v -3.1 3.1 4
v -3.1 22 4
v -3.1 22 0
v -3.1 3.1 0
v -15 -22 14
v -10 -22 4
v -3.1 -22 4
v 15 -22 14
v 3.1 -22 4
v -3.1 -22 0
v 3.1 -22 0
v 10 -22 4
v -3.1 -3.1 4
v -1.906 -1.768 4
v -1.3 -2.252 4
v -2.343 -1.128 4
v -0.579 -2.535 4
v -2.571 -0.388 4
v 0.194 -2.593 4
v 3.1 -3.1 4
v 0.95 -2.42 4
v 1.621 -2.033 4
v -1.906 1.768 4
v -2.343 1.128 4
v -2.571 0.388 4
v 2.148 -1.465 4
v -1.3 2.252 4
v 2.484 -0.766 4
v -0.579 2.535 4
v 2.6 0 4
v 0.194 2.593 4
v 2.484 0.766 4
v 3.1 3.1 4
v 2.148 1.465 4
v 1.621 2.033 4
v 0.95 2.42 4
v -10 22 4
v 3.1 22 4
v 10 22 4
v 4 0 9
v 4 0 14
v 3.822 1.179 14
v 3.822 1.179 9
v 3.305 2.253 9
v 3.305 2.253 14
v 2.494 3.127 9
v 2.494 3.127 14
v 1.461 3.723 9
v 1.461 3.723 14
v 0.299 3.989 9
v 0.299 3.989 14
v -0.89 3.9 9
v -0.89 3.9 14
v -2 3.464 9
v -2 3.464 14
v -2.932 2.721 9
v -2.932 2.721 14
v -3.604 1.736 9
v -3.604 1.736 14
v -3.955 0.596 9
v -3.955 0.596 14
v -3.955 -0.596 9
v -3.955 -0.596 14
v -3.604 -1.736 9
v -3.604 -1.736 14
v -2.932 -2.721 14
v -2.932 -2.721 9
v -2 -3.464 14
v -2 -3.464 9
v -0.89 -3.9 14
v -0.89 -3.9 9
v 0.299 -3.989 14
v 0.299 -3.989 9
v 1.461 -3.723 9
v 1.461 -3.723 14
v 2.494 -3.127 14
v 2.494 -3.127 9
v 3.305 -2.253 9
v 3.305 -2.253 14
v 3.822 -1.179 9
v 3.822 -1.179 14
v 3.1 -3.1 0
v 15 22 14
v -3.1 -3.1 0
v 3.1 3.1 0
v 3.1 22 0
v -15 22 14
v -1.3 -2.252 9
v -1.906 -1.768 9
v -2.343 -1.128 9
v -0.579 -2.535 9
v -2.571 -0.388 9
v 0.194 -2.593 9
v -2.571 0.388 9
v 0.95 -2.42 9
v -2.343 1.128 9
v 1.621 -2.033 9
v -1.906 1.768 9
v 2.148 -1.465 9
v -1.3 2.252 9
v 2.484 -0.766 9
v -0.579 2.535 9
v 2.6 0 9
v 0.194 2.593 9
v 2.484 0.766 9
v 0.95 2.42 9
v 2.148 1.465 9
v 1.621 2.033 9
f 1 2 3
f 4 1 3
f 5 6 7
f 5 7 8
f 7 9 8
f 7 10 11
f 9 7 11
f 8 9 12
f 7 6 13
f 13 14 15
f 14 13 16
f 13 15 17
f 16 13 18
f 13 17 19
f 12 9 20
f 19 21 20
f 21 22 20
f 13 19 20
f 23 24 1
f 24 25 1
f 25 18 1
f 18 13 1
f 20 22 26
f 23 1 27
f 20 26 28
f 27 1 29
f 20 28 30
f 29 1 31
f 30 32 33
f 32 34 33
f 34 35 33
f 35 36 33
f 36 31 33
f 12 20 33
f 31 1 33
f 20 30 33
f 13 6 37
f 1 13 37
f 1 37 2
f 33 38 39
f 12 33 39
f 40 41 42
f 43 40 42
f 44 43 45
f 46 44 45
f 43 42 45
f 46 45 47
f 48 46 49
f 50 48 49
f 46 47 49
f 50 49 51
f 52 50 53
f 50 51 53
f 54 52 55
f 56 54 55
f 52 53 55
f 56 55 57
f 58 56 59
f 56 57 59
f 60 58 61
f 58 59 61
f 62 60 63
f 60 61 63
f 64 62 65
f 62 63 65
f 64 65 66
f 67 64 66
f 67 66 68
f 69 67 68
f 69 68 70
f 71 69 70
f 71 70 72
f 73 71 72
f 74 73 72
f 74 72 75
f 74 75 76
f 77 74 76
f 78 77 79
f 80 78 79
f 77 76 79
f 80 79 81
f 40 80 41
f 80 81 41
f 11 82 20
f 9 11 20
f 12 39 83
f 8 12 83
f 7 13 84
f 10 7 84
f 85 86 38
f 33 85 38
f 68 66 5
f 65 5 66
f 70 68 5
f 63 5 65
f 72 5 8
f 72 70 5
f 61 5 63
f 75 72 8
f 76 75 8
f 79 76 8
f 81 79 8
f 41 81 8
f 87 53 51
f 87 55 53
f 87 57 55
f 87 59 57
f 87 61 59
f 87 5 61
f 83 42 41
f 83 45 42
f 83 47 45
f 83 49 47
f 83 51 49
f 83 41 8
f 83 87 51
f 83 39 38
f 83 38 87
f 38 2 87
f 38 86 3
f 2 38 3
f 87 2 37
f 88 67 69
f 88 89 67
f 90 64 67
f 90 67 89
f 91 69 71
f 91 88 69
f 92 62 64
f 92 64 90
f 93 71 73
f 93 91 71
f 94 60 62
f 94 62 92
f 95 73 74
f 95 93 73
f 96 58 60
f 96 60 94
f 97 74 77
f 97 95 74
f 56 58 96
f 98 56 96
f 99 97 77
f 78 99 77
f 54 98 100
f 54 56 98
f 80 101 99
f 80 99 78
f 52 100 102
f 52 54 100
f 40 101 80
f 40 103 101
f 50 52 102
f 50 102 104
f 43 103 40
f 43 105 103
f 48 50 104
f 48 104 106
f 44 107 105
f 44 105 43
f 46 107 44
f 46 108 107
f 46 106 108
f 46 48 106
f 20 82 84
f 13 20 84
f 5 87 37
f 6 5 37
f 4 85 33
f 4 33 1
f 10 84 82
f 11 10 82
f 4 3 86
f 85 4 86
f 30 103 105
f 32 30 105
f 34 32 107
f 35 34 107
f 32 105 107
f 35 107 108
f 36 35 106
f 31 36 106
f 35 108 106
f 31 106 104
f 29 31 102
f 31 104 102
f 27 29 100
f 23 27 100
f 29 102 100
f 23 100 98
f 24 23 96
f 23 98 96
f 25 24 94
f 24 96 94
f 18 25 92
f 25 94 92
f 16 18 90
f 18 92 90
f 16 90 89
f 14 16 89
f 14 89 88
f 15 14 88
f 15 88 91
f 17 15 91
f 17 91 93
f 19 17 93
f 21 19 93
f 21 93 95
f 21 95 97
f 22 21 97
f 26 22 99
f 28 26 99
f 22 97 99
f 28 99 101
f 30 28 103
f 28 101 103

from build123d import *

# Parameters (mm, degrees)
EXTRUDE_1_DEPTH     = 14
CUT_EXTRUDE_1_DEPTH = 44
SKETCH_3_W          = 6.2
SKETCH_3_H          = 6.2
CUT_EXTRUDE_2_DEPTH = 4
SKETCH_4_R          = 4
CUT_EXTRUDE_3_DEPTH = 5
SKETCH_5_R          = 2.6
CUT_EXTRUDE_4_DEPTH = 5


with BuildPart() as part:
    # 草图1 → 凸台-拉伸1 (new body)
    with BuildSketch(Plane.XY):
        Polygon((-15, 22), (-15, -22), (15, -22), (15, 22), (0, 22), align=None)
    extrude(amount=EXTRUDE_1_DEPTH)

    # 草图2 → 切除-拉伸1 (cut)
    with BuildSketch(Plane(origin=(0, 22, 0), x_dir=(1, 0, 0), z_dir=(0, 1, 0))):
        Polygon((-15, 0), (-15, -14), (-10, -4), (-3.1, -4), (-3.1, 0), align=None)
        Polygon((3.1, -4), (10, -4), (15, -14), (15, 0), (3.1, 0), align=None)
    extrude(amount=-CUT_EXTRUDE_1_DEPTH, mode=Mode.SUBTRACT)

    # 草图3 → 切除-拉伸2 (cut)
    with BuildSketch(Plane(origin=(0, 0, 0), x_dir=(-1, 0, 0), z_dir=(0, 0, -1))):
        Rectangle(SKETCH_3_W, SKETCH_3_H)
    extrude(amount=-CUT_EXTRUDE_2_DEPTH, mode=Mode.SUBTRACT)

    # 草图4 → 切除-拉伸3 (cut)
    with BuildSketch(Plane.XY.offset(14)):
        Circle(SKETCH_4_R)
    extrude(amount=-CUT_EXTRUDE_3_DEPTH, mode=Mode.SUBTRACT)

    # 草图5 → 切除-拉伸4 (cut)
    with BuildSketch(Plane.XY.offset(9)):
        Circle(SKETCH_5_R)
    extrude(amount=-CUT_EXTRUDE_4_DEPTH, mode=Mode.SUBTRACT)


solid = part.part
